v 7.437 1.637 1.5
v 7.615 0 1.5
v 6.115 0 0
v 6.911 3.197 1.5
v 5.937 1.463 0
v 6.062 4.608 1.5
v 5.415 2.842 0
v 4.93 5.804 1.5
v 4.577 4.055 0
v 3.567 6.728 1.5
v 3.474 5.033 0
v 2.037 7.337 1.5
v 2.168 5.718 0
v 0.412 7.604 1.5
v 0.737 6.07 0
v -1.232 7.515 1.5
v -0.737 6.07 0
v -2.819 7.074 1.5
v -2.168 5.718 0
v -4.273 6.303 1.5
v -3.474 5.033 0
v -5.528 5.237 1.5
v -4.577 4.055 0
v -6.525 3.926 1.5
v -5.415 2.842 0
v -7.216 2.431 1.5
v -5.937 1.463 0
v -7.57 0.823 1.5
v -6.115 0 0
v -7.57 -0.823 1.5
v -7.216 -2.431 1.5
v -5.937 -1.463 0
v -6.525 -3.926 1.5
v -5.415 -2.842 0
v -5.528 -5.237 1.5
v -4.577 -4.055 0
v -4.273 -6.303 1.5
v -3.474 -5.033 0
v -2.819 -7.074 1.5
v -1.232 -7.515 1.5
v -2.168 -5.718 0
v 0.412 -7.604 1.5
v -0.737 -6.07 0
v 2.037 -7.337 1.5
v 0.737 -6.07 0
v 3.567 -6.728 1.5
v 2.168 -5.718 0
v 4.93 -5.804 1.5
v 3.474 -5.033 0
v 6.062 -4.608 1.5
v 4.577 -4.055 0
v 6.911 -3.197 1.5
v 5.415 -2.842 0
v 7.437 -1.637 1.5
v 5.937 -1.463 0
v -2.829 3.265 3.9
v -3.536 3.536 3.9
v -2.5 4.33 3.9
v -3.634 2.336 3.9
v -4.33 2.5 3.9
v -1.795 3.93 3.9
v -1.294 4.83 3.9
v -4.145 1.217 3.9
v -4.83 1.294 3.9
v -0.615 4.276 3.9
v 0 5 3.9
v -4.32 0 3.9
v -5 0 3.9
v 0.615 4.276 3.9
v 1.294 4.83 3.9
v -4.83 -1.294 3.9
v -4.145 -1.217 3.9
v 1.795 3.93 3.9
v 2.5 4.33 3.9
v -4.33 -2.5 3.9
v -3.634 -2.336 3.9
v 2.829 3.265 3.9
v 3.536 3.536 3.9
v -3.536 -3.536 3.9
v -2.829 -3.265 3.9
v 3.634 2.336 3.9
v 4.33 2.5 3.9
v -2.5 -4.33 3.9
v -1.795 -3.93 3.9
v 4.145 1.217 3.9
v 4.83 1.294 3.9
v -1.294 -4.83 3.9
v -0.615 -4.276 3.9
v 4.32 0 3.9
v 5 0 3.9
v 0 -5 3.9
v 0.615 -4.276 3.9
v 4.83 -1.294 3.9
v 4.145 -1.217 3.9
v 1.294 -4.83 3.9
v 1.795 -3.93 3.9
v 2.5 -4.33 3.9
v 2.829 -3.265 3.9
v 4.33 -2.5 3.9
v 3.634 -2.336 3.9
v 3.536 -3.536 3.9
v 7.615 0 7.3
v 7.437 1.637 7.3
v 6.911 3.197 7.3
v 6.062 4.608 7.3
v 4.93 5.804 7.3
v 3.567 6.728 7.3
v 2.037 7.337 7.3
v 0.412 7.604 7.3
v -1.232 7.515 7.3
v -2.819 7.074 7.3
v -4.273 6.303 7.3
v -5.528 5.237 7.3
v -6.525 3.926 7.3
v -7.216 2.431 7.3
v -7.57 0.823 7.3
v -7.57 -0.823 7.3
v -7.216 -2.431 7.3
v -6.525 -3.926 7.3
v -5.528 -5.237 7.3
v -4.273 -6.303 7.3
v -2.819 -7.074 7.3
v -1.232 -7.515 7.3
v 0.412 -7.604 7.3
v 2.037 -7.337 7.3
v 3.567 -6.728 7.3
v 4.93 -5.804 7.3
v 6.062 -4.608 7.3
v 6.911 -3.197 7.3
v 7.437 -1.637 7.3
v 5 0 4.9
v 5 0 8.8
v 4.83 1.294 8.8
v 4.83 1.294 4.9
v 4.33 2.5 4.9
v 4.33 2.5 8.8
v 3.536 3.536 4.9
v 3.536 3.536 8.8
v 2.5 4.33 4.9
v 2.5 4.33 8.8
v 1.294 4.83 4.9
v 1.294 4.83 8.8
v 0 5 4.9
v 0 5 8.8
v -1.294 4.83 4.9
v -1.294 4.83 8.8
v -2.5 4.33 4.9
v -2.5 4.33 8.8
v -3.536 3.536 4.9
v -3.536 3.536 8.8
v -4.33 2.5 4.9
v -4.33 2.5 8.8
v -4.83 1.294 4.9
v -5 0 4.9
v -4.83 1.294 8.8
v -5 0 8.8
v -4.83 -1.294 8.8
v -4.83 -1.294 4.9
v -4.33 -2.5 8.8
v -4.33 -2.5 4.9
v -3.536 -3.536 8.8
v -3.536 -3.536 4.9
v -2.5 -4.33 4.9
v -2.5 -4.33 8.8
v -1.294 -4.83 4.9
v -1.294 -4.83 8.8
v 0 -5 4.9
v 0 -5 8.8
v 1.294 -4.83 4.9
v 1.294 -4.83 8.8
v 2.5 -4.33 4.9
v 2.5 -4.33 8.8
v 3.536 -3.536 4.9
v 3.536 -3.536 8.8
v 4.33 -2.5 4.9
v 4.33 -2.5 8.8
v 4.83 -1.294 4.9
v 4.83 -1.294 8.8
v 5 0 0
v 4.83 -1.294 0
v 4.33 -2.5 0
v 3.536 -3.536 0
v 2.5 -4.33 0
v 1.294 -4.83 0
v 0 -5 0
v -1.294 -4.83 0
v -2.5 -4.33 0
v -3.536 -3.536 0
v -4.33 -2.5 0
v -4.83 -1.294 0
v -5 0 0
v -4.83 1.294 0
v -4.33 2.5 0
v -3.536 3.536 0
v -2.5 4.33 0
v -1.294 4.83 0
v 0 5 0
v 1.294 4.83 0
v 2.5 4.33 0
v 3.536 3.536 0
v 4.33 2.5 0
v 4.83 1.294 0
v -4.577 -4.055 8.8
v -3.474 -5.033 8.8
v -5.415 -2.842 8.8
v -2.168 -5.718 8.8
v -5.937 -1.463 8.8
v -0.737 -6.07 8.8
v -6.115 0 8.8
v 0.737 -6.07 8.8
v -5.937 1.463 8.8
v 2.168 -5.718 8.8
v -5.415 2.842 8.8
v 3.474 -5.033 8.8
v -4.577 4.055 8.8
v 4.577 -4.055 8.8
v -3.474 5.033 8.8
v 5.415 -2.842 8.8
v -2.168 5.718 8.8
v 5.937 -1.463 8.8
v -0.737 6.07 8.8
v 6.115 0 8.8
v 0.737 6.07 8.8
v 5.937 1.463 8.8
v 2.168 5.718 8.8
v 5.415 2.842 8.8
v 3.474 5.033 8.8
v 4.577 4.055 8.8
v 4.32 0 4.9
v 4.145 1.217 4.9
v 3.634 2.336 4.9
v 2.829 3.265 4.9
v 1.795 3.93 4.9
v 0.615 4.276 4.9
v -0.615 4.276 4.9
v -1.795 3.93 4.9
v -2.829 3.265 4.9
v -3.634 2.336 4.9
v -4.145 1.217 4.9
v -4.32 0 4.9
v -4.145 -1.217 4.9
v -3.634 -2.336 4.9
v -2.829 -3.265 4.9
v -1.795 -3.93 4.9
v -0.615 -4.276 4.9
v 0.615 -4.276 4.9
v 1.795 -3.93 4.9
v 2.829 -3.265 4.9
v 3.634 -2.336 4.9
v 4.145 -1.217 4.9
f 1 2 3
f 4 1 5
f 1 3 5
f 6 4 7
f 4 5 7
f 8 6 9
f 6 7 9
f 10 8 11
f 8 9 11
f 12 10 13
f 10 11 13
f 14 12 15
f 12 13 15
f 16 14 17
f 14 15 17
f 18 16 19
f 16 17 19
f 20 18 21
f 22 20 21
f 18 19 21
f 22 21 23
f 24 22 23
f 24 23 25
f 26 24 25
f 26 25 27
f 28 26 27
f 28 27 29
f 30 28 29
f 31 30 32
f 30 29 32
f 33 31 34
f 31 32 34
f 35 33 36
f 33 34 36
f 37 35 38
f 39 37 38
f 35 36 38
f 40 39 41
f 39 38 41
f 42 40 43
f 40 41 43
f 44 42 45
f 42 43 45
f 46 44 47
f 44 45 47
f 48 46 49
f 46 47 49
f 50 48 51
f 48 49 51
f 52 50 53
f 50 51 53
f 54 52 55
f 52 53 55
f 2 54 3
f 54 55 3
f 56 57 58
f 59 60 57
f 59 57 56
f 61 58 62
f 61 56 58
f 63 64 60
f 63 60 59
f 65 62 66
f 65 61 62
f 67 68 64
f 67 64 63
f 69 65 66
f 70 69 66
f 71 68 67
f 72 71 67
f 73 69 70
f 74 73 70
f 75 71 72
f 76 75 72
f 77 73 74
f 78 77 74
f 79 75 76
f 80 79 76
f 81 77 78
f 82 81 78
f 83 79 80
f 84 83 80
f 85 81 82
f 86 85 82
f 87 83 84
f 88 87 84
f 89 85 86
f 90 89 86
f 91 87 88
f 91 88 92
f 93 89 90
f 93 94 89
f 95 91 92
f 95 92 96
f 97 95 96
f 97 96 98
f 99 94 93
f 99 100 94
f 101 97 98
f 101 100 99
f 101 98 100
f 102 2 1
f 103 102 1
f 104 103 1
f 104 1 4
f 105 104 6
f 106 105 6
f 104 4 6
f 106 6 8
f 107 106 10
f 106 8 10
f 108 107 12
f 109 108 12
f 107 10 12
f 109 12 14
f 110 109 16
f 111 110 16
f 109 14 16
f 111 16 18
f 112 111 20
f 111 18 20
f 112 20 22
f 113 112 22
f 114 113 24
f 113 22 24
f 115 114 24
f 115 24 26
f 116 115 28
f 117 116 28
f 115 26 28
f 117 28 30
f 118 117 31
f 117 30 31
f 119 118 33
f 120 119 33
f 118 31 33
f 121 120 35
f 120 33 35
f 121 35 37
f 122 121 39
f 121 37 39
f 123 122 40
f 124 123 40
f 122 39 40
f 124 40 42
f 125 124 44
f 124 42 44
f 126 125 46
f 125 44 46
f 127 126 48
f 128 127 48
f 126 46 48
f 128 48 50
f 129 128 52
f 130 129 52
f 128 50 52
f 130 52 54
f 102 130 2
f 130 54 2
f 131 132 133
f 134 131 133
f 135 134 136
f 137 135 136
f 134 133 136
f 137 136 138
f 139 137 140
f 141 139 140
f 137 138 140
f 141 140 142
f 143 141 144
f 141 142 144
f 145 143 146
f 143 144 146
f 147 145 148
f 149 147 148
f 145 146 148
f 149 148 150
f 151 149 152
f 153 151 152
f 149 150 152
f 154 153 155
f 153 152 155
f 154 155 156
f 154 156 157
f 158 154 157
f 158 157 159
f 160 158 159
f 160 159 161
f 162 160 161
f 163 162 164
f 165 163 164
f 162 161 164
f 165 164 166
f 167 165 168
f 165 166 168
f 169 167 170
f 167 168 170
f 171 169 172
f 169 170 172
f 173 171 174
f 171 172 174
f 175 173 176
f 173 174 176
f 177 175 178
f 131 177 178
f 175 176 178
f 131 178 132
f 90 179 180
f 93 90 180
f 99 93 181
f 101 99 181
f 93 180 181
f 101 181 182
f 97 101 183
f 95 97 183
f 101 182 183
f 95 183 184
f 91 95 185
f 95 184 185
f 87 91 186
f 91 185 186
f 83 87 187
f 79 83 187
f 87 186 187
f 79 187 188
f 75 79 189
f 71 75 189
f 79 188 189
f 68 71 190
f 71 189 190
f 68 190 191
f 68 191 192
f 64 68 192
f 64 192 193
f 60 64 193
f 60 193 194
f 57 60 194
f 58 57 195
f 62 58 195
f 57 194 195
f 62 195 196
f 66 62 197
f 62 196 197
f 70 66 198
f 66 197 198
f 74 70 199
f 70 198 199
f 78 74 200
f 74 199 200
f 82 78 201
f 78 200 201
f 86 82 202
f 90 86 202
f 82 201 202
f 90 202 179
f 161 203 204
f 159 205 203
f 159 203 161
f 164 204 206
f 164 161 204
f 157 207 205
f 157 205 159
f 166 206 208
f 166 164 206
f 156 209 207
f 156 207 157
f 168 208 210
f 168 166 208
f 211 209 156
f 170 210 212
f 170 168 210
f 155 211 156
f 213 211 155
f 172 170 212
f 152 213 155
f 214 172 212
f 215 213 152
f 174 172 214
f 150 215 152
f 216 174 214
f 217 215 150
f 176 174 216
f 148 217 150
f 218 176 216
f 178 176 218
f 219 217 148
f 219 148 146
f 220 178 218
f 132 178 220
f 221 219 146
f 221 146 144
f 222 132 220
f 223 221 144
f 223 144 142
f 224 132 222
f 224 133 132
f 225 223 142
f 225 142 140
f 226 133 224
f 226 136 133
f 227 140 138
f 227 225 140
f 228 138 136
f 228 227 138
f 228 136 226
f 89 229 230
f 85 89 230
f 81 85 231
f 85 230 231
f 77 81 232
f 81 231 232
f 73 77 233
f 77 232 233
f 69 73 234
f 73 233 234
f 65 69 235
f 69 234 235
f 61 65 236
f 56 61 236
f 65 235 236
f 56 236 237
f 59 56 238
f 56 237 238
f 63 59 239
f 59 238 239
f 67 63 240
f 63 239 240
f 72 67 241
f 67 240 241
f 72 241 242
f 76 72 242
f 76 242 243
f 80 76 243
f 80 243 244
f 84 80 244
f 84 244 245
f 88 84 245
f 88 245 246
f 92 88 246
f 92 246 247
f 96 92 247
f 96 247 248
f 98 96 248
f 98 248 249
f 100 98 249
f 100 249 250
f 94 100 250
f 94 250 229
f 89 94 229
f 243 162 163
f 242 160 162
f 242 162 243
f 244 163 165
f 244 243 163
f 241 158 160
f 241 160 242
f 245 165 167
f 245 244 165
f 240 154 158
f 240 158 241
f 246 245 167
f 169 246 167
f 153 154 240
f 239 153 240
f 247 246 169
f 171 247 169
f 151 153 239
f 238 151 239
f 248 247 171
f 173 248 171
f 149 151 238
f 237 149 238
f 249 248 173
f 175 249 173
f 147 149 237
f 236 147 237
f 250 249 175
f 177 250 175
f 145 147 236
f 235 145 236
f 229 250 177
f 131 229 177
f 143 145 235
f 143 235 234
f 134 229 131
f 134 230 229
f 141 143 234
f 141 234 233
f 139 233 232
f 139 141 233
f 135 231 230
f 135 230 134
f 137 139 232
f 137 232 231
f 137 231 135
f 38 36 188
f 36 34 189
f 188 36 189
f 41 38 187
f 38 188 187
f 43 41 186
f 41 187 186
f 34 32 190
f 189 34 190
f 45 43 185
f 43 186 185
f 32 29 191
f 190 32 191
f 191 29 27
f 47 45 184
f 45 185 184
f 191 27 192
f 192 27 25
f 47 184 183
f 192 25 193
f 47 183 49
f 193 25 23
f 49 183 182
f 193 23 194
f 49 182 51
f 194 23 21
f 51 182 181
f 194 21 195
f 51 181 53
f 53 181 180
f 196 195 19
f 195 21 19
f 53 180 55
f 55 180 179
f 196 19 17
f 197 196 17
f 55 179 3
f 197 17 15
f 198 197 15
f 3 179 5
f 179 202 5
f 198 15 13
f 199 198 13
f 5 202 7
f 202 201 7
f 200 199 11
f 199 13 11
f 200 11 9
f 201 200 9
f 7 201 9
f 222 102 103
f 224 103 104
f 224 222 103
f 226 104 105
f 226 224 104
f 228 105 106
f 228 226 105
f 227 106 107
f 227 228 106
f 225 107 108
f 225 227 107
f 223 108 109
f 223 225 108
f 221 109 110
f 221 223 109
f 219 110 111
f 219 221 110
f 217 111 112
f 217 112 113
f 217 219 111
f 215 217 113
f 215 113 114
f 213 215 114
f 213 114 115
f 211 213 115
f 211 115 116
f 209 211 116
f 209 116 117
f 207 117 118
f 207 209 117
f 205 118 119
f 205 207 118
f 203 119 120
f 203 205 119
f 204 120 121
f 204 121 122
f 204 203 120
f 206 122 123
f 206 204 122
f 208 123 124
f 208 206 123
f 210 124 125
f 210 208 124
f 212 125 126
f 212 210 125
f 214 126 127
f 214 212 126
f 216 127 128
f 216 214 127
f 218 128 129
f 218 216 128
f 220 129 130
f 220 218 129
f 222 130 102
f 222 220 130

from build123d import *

# Parameters (mm, degrees)
F0_R     = 7.615
F1_DEPTH = 8.8
F2_SIZE  = 1.5
F3_R     = 5
F4_DEPTH = 3.9
F5_R     = 5
F6_DEPTH = 3.9
F7_R     = 4.32
F8_DEPTH = 25


with BuildPart() as f1:
    # F0 (on Top) → F1 (new body)
    with BuildSketch(Plane.XY):
        Circle(F0_R)
    extrude(amount=F1_DEPTH)

    # F2
    f2_edges = [f1.edges().sort_by_distance(p)[0] for p in [
        (-7.615, 0, 8.8),
        (-7.615, 0, 0),
    ]]
    chamfer(f2_edges, length=F2_SIZE)

    # F3 (on face) → F4 (cut)
    with BuildSketch(Plane(origin=(0, 0, 0), x_dir=(1, 0, 0), z_dir=(0, 0, -1))):
        Circle(F3_R)
    extrude(amount=-F4_DEPTH, mode=Mode.SUBTRACT)

    # F5 (on face) → F6 (cut)
    with BuildSketch(Plane.XY.offset(8.8)):
        Circle(F5_R)
    extrude(amount=-F6_DEPTH, mode=Mode.SUBTRACT)

    # F7 (on face) → F8 (cut)
    with BuildSketch(Plane.XY.offset(4.9)):
        Circle(F7_R)
    extrude(amount=-F8_DEPTH, mode=Mode.SUBTRACT)


solid = f1.part
